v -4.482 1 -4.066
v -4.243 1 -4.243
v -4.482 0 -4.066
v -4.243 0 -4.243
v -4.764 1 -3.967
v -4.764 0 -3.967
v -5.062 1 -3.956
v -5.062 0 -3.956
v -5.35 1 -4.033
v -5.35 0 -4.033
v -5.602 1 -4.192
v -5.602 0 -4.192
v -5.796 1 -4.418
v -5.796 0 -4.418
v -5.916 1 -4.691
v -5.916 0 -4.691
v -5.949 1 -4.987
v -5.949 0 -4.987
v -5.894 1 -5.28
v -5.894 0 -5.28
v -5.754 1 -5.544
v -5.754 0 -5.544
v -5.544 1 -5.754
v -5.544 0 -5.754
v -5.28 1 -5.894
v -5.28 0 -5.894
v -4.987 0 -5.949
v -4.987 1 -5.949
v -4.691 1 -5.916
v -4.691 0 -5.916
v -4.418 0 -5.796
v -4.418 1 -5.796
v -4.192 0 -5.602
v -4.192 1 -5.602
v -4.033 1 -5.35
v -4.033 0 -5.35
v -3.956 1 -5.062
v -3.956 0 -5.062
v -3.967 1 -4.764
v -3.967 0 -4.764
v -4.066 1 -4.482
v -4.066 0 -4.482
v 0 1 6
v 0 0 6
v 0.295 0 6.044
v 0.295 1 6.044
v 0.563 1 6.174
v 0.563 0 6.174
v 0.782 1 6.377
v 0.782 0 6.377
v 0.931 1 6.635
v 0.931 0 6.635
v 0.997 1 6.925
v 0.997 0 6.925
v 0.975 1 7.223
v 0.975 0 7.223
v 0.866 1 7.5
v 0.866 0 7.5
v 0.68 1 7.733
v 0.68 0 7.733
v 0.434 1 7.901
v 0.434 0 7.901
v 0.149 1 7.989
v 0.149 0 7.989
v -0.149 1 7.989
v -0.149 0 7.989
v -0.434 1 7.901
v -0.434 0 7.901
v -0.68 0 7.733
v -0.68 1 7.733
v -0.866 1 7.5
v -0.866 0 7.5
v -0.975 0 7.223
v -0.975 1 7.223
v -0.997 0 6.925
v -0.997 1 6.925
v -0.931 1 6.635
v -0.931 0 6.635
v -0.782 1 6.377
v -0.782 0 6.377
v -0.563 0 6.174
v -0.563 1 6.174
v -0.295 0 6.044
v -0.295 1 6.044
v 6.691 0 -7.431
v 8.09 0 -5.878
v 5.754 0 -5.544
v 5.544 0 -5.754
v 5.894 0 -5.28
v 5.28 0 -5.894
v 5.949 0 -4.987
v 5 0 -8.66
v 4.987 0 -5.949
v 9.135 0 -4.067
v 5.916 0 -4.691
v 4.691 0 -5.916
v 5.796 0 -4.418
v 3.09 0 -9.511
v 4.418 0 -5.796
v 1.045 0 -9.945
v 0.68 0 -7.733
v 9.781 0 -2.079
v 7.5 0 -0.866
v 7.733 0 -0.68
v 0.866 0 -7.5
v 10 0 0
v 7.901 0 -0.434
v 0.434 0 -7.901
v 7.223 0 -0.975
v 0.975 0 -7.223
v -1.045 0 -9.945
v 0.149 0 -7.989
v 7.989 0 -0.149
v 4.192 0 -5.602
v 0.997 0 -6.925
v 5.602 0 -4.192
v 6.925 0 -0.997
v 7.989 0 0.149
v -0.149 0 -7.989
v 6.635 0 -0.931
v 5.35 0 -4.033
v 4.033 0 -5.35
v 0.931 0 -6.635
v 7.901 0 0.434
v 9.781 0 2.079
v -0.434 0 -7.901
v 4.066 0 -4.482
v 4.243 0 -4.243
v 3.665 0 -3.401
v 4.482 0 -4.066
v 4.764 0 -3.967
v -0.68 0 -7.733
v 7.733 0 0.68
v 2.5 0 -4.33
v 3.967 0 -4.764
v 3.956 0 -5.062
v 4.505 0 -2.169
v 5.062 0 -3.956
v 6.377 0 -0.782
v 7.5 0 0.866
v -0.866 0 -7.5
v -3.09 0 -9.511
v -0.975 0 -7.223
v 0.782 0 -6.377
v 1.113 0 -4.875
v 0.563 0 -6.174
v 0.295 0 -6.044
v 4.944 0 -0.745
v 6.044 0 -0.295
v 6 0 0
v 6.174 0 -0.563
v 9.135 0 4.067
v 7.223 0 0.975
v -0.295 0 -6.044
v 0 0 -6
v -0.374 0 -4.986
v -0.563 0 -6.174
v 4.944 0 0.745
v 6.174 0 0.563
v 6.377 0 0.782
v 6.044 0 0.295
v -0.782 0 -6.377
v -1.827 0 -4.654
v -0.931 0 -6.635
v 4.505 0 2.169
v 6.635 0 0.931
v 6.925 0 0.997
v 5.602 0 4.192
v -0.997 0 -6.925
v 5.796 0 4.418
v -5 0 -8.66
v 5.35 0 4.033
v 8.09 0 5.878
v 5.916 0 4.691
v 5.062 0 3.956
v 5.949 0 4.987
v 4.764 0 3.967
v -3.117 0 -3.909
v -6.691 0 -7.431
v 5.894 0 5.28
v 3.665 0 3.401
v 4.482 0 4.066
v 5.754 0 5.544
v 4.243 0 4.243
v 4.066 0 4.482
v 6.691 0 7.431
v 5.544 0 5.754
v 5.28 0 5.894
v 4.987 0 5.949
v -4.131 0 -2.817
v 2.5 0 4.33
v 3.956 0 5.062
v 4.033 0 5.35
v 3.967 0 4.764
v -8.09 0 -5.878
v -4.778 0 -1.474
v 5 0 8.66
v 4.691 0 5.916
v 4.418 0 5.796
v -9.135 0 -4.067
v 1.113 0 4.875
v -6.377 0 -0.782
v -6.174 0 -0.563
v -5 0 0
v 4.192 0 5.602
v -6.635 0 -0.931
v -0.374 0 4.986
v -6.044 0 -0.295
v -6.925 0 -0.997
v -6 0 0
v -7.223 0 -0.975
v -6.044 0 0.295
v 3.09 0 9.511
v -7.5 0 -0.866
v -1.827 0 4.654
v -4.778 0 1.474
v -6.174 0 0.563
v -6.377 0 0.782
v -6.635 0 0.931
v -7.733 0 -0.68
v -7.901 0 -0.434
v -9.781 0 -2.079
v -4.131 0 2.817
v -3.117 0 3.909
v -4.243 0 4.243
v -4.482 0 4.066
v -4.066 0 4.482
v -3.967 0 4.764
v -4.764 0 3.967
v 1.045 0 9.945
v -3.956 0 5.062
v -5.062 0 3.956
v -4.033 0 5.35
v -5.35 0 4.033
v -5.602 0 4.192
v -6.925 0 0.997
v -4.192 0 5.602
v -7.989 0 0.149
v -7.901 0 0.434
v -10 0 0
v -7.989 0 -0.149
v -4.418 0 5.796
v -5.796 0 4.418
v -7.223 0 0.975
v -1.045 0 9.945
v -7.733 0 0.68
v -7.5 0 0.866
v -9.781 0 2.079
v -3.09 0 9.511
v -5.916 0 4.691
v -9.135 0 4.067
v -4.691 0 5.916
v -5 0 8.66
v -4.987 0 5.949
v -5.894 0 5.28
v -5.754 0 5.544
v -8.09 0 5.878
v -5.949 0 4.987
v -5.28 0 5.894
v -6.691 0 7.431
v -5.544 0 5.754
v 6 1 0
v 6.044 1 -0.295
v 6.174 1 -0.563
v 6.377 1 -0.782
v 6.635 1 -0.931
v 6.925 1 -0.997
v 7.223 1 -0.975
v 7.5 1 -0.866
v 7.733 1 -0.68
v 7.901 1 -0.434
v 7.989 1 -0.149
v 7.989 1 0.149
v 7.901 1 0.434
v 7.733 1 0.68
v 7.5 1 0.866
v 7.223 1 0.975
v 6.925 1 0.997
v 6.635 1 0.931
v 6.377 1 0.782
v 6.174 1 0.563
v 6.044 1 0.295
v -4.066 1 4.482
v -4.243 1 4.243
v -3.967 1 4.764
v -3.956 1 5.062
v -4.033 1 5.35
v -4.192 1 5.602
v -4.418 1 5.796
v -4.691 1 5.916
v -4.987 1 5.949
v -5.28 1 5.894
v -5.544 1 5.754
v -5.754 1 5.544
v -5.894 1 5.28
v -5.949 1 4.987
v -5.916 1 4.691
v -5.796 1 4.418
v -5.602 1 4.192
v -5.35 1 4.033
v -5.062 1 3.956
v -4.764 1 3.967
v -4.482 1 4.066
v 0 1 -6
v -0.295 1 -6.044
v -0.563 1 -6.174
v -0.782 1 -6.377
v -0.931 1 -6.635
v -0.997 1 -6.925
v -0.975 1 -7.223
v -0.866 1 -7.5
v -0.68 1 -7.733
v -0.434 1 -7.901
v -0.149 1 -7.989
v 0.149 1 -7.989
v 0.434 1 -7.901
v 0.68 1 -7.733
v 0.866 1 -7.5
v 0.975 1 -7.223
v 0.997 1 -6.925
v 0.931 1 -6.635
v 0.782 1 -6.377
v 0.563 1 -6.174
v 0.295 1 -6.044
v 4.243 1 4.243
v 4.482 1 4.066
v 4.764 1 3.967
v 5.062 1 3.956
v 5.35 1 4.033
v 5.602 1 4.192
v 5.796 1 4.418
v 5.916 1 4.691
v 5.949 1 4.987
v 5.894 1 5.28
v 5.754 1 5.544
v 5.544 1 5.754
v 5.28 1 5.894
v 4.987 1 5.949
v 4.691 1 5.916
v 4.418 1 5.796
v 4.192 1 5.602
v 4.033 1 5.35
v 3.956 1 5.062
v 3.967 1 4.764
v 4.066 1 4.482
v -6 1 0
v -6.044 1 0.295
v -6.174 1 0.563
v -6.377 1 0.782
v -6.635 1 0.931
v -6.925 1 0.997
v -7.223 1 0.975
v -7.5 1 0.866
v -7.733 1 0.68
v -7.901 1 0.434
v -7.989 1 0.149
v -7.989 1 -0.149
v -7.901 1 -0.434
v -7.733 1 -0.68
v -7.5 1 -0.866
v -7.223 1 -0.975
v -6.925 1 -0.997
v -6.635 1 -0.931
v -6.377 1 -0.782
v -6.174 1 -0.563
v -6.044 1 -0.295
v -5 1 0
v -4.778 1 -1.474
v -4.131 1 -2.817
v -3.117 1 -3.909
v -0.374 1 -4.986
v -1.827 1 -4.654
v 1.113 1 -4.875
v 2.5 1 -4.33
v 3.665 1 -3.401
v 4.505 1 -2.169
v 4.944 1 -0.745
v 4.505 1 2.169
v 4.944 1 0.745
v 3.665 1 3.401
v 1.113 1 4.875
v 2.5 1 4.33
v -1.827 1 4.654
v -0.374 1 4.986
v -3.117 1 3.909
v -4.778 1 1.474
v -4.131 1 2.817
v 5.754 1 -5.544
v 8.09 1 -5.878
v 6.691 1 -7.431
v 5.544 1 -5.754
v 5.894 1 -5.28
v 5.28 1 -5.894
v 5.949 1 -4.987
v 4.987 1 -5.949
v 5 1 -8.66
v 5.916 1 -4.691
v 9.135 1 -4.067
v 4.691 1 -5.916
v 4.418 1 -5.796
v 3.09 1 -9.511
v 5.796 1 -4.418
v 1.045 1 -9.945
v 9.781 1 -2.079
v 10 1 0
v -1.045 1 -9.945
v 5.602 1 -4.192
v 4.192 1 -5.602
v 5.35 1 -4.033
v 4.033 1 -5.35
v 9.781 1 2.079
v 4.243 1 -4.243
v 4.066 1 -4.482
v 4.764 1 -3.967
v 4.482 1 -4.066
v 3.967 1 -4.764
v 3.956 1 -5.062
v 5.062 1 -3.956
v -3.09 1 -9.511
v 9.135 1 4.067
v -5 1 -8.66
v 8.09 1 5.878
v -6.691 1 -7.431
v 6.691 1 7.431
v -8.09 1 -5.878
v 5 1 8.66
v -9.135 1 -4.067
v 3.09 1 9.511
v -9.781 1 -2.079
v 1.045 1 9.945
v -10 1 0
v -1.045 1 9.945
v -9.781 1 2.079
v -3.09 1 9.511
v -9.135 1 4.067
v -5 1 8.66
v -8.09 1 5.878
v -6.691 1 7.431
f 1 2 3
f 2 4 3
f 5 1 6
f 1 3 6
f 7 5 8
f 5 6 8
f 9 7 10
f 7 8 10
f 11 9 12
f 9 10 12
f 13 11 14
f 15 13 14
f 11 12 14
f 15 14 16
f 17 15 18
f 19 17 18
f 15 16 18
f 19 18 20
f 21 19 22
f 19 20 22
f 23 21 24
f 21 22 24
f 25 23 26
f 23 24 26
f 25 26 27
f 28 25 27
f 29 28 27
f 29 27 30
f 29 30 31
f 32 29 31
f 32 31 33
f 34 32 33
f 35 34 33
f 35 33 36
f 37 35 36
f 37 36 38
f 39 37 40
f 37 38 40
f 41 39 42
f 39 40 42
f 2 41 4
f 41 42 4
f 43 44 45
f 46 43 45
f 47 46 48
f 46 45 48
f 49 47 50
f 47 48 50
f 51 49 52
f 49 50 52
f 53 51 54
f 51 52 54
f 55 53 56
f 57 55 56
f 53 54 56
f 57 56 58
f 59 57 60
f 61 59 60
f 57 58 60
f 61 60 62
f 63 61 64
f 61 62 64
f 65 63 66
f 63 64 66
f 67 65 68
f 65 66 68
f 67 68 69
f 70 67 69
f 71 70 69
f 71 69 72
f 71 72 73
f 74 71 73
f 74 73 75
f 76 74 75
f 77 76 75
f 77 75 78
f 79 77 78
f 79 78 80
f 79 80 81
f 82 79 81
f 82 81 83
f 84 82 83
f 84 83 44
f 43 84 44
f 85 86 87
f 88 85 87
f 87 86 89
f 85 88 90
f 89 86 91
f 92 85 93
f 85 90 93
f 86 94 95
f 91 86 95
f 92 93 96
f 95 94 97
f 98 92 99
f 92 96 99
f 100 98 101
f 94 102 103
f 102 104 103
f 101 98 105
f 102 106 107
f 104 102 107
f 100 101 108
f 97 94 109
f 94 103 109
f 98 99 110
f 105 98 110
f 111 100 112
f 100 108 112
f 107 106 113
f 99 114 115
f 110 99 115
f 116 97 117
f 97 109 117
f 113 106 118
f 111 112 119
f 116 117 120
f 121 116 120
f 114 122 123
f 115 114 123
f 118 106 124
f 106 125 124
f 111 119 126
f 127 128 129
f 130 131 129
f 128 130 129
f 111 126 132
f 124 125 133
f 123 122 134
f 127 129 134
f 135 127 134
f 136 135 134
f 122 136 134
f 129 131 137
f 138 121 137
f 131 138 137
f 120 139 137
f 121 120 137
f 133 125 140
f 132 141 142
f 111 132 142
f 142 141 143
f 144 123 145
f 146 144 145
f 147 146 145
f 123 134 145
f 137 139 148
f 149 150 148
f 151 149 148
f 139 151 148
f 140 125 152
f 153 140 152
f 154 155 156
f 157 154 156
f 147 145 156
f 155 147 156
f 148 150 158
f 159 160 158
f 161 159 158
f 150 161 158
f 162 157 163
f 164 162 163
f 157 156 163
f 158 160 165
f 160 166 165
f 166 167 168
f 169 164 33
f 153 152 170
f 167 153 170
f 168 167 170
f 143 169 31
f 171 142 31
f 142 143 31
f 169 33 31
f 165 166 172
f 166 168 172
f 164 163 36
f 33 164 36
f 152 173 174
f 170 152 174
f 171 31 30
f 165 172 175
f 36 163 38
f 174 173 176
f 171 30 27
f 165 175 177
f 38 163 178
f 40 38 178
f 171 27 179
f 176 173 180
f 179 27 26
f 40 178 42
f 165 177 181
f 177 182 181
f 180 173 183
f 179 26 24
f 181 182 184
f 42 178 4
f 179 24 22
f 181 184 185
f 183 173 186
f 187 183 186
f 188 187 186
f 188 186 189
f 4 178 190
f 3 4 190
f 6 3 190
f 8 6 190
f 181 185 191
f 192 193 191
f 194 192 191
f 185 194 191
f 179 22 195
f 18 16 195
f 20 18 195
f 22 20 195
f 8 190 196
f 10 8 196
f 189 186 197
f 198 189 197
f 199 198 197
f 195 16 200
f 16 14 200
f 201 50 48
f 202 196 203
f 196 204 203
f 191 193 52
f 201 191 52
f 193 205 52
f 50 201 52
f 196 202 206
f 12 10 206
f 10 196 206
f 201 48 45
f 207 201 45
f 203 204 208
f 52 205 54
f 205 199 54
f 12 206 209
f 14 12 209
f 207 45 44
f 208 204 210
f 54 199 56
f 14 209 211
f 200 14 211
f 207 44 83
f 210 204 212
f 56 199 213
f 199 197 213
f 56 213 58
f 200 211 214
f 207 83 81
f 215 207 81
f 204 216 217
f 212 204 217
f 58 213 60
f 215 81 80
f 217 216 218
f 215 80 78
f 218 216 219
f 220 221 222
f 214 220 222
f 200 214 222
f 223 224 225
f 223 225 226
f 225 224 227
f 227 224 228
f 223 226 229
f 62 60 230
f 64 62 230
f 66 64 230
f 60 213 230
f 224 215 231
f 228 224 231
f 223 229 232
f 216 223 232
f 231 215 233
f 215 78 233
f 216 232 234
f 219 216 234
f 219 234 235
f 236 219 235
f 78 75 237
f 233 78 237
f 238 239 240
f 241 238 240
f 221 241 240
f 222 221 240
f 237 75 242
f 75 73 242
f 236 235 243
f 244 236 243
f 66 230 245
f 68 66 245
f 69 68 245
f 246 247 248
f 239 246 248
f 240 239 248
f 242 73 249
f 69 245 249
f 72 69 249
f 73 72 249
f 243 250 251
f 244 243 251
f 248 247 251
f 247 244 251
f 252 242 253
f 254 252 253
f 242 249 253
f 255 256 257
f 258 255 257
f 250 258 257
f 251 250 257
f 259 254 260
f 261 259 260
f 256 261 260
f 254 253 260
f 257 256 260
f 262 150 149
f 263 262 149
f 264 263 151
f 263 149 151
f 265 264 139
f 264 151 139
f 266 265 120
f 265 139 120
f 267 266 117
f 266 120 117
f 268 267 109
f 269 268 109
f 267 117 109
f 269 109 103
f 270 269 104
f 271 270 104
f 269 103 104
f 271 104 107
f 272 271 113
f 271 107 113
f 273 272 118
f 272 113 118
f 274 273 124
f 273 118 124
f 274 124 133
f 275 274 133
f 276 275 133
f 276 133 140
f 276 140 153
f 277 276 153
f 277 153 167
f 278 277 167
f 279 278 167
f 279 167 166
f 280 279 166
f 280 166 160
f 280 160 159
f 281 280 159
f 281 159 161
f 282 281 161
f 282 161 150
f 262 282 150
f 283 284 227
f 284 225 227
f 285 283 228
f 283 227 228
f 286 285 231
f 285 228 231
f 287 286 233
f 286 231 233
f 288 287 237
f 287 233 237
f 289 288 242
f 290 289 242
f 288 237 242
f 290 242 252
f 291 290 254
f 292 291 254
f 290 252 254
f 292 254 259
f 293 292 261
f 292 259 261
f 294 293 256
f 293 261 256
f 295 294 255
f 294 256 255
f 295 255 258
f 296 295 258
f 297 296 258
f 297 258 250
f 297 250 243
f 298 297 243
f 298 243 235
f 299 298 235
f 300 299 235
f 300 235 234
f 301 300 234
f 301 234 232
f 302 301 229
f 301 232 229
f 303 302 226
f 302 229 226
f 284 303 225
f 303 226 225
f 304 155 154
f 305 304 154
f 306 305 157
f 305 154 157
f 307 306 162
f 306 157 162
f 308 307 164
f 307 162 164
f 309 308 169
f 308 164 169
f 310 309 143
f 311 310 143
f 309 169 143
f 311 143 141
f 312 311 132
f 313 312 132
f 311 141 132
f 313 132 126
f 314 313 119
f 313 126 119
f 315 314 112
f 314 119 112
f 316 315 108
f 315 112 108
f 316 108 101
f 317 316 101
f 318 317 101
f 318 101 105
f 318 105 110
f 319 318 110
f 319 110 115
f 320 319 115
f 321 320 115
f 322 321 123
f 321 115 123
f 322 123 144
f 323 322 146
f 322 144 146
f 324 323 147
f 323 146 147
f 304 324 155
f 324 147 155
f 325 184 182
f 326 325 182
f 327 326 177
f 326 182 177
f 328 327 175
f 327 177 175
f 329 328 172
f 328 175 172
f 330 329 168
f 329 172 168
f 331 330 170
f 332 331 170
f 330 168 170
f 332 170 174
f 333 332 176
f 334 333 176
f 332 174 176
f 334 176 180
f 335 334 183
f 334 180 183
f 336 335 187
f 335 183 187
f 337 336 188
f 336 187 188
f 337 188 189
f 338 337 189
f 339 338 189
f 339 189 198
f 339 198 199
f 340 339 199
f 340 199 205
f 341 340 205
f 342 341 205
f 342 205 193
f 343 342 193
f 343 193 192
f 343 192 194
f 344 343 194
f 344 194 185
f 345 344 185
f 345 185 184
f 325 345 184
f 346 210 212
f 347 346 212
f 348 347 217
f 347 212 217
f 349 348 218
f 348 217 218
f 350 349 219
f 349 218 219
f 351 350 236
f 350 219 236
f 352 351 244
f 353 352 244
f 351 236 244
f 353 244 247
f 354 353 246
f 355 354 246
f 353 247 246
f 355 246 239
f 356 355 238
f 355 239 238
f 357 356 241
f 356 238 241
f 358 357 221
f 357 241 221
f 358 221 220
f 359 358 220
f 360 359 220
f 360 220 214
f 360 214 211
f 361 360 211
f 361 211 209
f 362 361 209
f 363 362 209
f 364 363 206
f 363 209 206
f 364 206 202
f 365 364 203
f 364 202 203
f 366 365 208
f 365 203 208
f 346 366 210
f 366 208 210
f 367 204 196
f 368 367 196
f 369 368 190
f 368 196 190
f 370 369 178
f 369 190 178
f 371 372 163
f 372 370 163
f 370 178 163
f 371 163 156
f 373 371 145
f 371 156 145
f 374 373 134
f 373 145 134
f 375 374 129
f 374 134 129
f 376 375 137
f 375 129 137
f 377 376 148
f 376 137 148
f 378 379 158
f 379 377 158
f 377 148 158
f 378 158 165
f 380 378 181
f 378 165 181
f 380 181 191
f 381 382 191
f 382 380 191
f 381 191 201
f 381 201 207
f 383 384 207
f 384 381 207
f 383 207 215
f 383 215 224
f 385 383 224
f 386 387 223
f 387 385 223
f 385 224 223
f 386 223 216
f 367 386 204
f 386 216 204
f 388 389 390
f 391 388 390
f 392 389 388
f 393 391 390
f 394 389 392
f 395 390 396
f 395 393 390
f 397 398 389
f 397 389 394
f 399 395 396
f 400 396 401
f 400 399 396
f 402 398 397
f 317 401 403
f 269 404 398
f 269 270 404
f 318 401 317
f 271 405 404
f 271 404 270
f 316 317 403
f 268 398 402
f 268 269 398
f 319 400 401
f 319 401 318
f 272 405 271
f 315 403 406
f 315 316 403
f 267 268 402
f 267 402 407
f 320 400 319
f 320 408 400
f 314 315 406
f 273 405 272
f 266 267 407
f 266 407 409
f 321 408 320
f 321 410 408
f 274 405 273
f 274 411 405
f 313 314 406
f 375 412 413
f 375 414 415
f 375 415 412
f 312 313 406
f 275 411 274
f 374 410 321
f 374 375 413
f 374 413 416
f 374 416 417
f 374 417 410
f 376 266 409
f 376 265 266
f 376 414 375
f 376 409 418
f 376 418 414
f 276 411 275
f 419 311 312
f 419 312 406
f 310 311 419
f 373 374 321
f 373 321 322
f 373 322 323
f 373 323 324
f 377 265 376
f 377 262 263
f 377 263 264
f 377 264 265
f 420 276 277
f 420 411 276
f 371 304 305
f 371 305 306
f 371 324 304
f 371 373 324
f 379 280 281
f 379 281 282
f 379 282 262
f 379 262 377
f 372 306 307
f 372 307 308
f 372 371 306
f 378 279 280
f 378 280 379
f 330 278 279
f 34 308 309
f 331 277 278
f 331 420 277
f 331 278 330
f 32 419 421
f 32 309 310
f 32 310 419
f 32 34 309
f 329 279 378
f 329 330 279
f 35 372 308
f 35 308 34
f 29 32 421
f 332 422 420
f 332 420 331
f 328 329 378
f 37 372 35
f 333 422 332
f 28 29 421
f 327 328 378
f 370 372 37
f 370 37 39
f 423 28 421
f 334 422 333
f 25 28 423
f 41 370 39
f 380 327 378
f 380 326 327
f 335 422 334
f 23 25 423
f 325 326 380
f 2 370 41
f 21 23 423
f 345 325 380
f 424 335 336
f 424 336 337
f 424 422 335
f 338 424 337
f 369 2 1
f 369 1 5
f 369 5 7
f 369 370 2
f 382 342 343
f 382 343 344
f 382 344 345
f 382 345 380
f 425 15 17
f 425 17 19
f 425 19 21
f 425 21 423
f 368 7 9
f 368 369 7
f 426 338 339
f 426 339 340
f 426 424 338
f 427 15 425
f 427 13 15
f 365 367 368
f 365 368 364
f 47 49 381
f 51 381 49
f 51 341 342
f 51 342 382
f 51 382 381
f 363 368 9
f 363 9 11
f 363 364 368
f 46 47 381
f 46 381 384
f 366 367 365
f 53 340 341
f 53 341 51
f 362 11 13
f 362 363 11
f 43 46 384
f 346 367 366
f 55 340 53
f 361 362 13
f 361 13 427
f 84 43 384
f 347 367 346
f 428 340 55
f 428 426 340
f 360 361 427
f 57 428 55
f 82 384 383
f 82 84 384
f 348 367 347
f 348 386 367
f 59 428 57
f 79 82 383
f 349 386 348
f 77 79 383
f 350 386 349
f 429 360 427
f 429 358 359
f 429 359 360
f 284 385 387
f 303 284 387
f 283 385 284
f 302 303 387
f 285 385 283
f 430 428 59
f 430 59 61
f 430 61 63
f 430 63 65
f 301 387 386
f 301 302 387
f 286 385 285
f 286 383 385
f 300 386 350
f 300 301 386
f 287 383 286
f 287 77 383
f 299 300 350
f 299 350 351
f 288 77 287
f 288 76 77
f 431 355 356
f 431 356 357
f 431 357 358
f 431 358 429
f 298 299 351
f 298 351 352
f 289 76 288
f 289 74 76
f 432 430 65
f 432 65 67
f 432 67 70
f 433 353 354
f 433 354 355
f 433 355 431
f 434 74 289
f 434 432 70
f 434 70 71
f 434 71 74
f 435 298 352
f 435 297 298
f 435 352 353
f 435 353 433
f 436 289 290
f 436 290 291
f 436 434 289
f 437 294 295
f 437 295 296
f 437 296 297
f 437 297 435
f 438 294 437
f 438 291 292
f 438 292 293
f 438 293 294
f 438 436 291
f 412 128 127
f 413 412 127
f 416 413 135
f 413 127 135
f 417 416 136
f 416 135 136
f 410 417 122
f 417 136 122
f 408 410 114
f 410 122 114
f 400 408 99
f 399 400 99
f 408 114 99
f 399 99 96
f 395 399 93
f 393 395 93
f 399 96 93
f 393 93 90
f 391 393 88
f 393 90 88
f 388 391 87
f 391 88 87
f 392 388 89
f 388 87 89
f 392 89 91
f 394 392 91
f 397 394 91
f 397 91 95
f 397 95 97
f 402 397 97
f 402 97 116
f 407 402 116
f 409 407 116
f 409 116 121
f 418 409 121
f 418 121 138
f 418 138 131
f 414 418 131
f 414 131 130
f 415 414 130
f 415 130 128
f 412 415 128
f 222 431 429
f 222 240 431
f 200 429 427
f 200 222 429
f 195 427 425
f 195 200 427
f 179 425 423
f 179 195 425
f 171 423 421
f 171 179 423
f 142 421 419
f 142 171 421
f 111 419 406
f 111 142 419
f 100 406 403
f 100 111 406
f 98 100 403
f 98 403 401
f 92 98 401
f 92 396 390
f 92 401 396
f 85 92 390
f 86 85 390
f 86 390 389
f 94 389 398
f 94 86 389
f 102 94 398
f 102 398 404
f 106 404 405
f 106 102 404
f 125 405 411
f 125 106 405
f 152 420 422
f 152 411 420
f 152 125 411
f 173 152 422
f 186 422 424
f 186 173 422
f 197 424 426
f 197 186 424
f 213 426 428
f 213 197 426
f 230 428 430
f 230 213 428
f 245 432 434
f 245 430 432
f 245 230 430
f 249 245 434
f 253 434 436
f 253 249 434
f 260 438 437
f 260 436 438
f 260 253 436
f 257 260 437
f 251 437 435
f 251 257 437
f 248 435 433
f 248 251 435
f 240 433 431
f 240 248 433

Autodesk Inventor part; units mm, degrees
ref_plane "YZ Plane" through (0, 0, 0) normal (1, 0, 0) x (0, 1, 0)
ref_plane "XZ Plane" through (0, 0, 0) normal (0, 1, 0) x (-1, 0, 0)
ref_plane "XY Plane" through (0, 0, 0) normal (0, 0, 1) x (1, 0, 0)
sketch "スケッチ1" plane through (0, 0, 0) normal (0, 1, 0) x (-1, 0, 0)
  circle A0 centre (0, 0) radius 10
  circle A1 centre (0, 0) radius 5
  dimension "d0" = 20
  dimension "d2" = 10
extrude "押し出し1" add sketch "スケッチ1" along normal blind 1
sketch "スケッチ2" plane through (0, 1, 0) normal (0, 1, 0) x (1, 0, 0)
  circle A0 centre (0, 0) radius 5 projected
  circle A1 centre (0, 7) radius 1
  dimension "d5" = 2
  dimension "d7" = 7
  dimension "d8" = 0
hole "穴1" at (0, 1, -7) direction (0, -1, 0) diameter 2 end through all
pattern_circular "円形状パターン1" count 8 over 360 about axis through (0, 0, 0) along (0, 1, 0) of "穴1"
properties part number "8" material "アセタール樹脂、白"
